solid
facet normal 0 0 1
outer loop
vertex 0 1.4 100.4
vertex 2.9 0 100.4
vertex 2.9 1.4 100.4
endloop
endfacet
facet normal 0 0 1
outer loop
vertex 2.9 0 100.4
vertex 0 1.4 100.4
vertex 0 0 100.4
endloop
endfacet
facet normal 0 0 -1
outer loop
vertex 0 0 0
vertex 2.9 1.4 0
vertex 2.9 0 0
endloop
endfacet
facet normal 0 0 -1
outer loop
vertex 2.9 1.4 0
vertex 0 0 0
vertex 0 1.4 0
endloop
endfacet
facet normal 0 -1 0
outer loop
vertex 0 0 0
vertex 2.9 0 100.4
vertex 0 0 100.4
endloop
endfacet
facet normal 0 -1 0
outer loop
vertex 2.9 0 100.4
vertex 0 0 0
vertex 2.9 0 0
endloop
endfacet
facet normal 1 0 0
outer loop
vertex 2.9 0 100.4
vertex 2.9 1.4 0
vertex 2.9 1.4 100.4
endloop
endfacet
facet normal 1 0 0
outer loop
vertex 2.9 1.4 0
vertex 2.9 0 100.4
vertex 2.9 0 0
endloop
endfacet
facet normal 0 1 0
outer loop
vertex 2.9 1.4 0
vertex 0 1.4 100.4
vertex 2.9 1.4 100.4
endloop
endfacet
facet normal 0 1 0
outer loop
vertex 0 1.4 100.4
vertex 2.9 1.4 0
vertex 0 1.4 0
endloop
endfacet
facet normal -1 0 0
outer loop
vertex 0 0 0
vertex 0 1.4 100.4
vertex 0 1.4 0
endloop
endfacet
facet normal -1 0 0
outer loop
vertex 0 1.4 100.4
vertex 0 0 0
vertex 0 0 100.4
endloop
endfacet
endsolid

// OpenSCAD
function ZipTieWidth(3dPrinterTolerance=.4)=2.5+3dPrinterTolerance;
function ZipTieHeight(3dPrinterTolerance=.4)=1+3dPrinterTolerance;
function ZipTieLength(3dPrinterTolerance=.4)=100+3dPrinterTolerance;

module ZipTie(3dPrinterTolerance=.4)
{
	cube([ZipTieWidth(3dPrinterTolerance), ZipTieHeight(3dPrinterTolerance),ZipTieLength(3dPrinterTolerance)]);
}

ZipTie(.4);
